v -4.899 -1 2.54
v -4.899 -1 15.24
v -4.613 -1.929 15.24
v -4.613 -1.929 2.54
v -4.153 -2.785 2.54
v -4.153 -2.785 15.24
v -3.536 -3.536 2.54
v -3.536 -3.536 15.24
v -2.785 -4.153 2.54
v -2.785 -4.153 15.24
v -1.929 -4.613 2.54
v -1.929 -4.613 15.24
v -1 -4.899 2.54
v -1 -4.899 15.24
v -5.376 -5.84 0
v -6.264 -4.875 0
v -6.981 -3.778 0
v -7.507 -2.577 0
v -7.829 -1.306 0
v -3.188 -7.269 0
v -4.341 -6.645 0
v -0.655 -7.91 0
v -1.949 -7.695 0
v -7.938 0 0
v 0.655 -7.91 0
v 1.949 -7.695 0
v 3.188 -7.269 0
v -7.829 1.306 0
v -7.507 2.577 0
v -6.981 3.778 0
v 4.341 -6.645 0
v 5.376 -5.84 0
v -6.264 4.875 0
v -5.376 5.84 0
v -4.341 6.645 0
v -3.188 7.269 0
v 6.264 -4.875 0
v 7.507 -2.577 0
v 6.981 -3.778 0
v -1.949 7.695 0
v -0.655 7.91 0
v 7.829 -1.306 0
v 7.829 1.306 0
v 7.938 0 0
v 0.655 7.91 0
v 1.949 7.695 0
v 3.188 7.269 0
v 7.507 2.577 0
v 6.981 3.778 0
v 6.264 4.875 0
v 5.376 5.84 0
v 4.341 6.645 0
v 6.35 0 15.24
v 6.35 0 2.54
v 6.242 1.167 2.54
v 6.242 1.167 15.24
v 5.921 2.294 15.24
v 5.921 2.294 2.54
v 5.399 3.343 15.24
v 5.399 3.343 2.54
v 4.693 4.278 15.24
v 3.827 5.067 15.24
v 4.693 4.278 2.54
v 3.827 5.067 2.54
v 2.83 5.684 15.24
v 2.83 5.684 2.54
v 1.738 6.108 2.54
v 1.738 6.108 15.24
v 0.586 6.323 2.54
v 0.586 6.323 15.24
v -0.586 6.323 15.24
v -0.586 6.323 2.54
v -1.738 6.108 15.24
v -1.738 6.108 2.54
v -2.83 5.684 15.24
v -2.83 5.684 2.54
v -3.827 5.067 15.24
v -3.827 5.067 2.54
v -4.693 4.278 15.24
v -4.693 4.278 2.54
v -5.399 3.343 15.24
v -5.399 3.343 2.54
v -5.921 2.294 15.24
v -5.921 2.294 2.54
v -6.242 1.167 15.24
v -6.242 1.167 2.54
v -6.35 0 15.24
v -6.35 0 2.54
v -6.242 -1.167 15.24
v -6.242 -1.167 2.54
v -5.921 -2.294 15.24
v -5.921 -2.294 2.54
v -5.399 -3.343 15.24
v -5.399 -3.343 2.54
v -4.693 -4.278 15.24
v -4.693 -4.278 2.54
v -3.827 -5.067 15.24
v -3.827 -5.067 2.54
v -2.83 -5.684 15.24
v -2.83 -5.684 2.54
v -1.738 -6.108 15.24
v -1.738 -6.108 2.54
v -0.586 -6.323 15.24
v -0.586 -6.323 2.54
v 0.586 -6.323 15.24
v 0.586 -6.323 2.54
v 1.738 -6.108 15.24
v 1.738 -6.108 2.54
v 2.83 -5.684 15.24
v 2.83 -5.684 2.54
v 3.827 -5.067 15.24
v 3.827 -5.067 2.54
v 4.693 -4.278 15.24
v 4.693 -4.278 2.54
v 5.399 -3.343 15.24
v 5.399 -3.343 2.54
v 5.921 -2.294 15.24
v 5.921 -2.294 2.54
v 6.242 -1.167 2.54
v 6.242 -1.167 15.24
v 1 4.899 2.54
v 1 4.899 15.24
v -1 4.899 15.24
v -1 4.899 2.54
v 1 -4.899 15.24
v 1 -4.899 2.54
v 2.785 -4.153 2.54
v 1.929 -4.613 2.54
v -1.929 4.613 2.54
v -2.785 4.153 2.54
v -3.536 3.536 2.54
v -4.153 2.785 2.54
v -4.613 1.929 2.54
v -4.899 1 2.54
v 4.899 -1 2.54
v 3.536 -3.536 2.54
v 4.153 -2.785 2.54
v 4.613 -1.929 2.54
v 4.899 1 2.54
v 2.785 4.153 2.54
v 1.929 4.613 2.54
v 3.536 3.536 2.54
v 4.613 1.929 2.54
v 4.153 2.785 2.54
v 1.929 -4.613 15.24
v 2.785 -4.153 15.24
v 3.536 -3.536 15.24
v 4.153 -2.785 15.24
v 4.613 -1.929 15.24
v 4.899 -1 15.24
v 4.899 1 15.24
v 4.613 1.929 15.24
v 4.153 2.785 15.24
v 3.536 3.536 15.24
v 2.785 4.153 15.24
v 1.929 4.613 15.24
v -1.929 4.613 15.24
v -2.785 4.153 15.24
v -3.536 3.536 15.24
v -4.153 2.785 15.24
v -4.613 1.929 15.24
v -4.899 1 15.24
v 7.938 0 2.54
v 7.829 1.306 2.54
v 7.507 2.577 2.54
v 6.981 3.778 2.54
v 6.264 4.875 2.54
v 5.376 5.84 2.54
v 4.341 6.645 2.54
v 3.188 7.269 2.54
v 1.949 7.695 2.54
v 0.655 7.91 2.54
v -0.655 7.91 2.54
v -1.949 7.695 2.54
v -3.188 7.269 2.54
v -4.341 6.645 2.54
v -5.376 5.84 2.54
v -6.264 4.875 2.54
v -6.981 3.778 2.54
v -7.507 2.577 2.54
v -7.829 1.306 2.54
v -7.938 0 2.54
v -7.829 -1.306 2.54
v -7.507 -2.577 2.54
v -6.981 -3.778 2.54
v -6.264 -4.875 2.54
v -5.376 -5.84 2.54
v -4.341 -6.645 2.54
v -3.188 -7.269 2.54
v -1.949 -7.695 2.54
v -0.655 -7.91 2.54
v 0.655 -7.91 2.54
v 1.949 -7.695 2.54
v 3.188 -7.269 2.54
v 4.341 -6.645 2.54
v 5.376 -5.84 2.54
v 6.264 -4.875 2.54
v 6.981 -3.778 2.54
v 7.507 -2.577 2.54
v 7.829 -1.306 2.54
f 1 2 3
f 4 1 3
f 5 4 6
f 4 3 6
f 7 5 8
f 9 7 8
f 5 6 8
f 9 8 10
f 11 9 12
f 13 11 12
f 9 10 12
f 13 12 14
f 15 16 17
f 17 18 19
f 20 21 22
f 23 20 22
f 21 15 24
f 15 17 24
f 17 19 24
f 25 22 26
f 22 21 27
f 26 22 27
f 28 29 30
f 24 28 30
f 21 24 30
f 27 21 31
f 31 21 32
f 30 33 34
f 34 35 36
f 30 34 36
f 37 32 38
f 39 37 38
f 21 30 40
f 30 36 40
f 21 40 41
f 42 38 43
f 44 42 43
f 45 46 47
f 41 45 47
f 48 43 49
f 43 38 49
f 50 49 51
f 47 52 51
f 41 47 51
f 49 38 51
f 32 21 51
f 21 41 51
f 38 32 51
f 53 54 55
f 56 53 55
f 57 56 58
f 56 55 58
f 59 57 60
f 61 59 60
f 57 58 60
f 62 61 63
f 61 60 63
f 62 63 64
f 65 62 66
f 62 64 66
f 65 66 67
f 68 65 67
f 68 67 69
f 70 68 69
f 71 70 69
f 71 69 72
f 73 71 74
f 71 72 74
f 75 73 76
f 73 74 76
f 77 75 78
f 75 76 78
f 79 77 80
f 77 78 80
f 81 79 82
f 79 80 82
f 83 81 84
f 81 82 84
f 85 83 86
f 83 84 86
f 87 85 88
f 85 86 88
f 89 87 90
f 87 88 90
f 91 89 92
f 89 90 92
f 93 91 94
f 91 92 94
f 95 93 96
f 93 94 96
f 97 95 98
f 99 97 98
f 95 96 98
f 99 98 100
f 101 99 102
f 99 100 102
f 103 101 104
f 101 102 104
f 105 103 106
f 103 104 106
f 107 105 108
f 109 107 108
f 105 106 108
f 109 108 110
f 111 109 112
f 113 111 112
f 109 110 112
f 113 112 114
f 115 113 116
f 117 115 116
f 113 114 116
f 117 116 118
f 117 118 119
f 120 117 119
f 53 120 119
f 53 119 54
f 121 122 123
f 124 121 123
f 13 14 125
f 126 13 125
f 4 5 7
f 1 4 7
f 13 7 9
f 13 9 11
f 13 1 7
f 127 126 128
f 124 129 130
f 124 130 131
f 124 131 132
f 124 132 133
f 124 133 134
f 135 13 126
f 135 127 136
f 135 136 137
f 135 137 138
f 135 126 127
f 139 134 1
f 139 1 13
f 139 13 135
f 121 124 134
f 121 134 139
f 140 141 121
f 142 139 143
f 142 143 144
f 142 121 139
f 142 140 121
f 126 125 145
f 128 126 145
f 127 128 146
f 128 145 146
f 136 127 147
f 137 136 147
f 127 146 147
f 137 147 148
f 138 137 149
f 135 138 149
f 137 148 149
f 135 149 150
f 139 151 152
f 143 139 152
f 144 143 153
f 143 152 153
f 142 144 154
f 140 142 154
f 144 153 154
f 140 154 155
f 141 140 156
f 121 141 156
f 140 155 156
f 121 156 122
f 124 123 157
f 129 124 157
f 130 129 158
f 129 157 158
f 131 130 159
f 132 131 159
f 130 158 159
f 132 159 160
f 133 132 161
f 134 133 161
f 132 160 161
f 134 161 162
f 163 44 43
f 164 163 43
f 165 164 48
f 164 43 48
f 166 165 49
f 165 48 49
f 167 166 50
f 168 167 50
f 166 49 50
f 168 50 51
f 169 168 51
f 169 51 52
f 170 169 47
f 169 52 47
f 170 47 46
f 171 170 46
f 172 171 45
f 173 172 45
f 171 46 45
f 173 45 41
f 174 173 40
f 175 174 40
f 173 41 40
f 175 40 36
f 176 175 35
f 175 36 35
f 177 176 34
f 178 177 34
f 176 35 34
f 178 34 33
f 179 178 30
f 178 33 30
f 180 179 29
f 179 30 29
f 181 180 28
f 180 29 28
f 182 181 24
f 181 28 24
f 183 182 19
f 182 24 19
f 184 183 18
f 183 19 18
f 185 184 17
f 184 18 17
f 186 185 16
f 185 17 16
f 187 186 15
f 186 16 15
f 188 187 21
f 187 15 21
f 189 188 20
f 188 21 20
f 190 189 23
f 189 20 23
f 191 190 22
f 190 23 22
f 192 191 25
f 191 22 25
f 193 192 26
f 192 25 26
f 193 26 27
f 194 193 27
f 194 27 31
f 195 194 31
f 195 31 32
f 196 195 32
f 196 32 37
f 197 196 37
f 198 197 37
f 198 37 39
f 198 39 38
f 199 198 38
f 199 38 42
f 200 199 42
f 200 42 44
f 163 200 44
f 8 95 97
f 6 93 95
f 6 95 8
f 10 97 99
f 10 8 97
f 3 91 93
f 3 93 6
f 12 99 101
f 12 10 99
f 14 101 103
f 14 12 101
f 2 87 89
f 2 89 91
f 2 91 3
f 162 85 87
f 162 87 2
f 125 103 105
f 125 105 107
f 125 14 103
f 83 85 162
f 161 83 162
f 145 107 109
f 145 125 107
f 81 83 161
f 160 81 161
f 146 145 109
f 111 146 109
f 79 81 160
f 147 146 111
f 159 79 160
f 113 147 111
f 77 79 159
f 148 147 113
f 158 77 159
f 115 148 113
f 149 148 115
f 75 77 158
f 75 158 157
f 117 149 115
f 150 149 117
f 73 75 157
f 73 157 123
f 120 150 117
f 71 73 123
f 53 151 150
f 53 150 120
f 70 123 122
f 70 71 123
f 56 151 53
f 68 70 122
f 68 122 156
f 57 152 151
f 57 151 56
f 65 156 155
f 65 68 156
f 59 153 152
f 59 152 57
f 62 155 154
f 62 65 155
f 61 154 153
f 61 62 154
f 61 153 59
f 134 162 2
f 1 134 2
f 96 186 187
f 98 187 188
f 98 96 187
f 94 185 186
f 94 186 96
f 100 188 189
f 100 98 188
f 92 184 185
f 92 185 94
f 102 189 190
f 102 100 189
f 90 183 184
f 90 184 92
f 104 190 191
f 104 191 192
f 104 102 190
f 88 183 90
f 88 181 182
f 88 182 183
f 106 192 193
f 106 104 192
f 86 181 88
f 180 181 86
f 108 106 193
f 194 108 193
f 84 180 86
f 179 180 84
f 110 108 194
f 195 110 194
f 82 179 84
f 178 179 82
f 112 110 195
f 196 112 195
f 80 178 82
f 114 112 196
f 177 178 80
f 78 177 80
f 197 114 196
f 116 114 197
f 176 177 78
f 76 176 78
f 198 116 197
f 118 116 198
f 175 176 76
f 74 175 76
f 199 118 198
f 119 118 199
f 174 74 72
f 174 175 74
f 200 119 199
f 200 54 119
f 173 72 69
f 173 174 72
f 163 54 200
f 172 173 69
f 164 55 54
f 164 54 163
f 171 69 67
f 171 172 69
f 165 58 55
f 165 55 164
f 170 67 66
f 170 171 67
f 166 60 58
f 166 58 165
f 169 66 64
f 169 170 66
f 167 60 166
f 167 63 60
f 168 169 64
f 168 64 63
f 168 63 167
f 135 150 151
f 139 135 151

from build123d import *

# Parameters (mm, degrees)
F0_R     = 7.9375
F1_DEPTH = 2.54
F2_R     = 6.35
F3_DEPTH = 12.7
F5_DEPTH = 12.7


with BuildPart() as f1:
    # F0 (on Top) → F1 (new body)
    with BuildSketch(Plane.XY):
        Circle(F0_R)
    extrude(amount=F1_DEPTH)

    # F2 (on face) → F3 (join)
    with BuildSketch(Plane.XY.offset(2.54)):
        Circle(F2_R)
    extrude(amount=F3_DEPTH)

    # F4 (on face) → F5 (cut, through all)
    with BuildSketch(Plane.XY.offset(15.24)):
        with BuildLine():
            Line((1, 4.898979), (-1, 4.898979))
            ThreePointArc((-1, 4.898979), (-3.535534, 3.535534), (-4.898979, 1))
            Line((-4.898979, 1), (-4.898979, -1))
            ThreePointArc((-4.898979, -1), (-3.535534, -3.535534), (-1, -4.898979))
            Line((-1, -4.898979), (1, -4.898979))
            ThreePointArc((1, -4.898979), (3.535534, -3.535534), (4.898979, -1))
            Line((4.898979, -1), (4.898979, 1))
            ThreePointArc((4.898979, 1), (3.535534, 3.535534), (1, 4.898979))
        make_face()
    extrude(amount=-F5_DEPTH, mode=Mode.SUBTRACT)


solid = f1.part
